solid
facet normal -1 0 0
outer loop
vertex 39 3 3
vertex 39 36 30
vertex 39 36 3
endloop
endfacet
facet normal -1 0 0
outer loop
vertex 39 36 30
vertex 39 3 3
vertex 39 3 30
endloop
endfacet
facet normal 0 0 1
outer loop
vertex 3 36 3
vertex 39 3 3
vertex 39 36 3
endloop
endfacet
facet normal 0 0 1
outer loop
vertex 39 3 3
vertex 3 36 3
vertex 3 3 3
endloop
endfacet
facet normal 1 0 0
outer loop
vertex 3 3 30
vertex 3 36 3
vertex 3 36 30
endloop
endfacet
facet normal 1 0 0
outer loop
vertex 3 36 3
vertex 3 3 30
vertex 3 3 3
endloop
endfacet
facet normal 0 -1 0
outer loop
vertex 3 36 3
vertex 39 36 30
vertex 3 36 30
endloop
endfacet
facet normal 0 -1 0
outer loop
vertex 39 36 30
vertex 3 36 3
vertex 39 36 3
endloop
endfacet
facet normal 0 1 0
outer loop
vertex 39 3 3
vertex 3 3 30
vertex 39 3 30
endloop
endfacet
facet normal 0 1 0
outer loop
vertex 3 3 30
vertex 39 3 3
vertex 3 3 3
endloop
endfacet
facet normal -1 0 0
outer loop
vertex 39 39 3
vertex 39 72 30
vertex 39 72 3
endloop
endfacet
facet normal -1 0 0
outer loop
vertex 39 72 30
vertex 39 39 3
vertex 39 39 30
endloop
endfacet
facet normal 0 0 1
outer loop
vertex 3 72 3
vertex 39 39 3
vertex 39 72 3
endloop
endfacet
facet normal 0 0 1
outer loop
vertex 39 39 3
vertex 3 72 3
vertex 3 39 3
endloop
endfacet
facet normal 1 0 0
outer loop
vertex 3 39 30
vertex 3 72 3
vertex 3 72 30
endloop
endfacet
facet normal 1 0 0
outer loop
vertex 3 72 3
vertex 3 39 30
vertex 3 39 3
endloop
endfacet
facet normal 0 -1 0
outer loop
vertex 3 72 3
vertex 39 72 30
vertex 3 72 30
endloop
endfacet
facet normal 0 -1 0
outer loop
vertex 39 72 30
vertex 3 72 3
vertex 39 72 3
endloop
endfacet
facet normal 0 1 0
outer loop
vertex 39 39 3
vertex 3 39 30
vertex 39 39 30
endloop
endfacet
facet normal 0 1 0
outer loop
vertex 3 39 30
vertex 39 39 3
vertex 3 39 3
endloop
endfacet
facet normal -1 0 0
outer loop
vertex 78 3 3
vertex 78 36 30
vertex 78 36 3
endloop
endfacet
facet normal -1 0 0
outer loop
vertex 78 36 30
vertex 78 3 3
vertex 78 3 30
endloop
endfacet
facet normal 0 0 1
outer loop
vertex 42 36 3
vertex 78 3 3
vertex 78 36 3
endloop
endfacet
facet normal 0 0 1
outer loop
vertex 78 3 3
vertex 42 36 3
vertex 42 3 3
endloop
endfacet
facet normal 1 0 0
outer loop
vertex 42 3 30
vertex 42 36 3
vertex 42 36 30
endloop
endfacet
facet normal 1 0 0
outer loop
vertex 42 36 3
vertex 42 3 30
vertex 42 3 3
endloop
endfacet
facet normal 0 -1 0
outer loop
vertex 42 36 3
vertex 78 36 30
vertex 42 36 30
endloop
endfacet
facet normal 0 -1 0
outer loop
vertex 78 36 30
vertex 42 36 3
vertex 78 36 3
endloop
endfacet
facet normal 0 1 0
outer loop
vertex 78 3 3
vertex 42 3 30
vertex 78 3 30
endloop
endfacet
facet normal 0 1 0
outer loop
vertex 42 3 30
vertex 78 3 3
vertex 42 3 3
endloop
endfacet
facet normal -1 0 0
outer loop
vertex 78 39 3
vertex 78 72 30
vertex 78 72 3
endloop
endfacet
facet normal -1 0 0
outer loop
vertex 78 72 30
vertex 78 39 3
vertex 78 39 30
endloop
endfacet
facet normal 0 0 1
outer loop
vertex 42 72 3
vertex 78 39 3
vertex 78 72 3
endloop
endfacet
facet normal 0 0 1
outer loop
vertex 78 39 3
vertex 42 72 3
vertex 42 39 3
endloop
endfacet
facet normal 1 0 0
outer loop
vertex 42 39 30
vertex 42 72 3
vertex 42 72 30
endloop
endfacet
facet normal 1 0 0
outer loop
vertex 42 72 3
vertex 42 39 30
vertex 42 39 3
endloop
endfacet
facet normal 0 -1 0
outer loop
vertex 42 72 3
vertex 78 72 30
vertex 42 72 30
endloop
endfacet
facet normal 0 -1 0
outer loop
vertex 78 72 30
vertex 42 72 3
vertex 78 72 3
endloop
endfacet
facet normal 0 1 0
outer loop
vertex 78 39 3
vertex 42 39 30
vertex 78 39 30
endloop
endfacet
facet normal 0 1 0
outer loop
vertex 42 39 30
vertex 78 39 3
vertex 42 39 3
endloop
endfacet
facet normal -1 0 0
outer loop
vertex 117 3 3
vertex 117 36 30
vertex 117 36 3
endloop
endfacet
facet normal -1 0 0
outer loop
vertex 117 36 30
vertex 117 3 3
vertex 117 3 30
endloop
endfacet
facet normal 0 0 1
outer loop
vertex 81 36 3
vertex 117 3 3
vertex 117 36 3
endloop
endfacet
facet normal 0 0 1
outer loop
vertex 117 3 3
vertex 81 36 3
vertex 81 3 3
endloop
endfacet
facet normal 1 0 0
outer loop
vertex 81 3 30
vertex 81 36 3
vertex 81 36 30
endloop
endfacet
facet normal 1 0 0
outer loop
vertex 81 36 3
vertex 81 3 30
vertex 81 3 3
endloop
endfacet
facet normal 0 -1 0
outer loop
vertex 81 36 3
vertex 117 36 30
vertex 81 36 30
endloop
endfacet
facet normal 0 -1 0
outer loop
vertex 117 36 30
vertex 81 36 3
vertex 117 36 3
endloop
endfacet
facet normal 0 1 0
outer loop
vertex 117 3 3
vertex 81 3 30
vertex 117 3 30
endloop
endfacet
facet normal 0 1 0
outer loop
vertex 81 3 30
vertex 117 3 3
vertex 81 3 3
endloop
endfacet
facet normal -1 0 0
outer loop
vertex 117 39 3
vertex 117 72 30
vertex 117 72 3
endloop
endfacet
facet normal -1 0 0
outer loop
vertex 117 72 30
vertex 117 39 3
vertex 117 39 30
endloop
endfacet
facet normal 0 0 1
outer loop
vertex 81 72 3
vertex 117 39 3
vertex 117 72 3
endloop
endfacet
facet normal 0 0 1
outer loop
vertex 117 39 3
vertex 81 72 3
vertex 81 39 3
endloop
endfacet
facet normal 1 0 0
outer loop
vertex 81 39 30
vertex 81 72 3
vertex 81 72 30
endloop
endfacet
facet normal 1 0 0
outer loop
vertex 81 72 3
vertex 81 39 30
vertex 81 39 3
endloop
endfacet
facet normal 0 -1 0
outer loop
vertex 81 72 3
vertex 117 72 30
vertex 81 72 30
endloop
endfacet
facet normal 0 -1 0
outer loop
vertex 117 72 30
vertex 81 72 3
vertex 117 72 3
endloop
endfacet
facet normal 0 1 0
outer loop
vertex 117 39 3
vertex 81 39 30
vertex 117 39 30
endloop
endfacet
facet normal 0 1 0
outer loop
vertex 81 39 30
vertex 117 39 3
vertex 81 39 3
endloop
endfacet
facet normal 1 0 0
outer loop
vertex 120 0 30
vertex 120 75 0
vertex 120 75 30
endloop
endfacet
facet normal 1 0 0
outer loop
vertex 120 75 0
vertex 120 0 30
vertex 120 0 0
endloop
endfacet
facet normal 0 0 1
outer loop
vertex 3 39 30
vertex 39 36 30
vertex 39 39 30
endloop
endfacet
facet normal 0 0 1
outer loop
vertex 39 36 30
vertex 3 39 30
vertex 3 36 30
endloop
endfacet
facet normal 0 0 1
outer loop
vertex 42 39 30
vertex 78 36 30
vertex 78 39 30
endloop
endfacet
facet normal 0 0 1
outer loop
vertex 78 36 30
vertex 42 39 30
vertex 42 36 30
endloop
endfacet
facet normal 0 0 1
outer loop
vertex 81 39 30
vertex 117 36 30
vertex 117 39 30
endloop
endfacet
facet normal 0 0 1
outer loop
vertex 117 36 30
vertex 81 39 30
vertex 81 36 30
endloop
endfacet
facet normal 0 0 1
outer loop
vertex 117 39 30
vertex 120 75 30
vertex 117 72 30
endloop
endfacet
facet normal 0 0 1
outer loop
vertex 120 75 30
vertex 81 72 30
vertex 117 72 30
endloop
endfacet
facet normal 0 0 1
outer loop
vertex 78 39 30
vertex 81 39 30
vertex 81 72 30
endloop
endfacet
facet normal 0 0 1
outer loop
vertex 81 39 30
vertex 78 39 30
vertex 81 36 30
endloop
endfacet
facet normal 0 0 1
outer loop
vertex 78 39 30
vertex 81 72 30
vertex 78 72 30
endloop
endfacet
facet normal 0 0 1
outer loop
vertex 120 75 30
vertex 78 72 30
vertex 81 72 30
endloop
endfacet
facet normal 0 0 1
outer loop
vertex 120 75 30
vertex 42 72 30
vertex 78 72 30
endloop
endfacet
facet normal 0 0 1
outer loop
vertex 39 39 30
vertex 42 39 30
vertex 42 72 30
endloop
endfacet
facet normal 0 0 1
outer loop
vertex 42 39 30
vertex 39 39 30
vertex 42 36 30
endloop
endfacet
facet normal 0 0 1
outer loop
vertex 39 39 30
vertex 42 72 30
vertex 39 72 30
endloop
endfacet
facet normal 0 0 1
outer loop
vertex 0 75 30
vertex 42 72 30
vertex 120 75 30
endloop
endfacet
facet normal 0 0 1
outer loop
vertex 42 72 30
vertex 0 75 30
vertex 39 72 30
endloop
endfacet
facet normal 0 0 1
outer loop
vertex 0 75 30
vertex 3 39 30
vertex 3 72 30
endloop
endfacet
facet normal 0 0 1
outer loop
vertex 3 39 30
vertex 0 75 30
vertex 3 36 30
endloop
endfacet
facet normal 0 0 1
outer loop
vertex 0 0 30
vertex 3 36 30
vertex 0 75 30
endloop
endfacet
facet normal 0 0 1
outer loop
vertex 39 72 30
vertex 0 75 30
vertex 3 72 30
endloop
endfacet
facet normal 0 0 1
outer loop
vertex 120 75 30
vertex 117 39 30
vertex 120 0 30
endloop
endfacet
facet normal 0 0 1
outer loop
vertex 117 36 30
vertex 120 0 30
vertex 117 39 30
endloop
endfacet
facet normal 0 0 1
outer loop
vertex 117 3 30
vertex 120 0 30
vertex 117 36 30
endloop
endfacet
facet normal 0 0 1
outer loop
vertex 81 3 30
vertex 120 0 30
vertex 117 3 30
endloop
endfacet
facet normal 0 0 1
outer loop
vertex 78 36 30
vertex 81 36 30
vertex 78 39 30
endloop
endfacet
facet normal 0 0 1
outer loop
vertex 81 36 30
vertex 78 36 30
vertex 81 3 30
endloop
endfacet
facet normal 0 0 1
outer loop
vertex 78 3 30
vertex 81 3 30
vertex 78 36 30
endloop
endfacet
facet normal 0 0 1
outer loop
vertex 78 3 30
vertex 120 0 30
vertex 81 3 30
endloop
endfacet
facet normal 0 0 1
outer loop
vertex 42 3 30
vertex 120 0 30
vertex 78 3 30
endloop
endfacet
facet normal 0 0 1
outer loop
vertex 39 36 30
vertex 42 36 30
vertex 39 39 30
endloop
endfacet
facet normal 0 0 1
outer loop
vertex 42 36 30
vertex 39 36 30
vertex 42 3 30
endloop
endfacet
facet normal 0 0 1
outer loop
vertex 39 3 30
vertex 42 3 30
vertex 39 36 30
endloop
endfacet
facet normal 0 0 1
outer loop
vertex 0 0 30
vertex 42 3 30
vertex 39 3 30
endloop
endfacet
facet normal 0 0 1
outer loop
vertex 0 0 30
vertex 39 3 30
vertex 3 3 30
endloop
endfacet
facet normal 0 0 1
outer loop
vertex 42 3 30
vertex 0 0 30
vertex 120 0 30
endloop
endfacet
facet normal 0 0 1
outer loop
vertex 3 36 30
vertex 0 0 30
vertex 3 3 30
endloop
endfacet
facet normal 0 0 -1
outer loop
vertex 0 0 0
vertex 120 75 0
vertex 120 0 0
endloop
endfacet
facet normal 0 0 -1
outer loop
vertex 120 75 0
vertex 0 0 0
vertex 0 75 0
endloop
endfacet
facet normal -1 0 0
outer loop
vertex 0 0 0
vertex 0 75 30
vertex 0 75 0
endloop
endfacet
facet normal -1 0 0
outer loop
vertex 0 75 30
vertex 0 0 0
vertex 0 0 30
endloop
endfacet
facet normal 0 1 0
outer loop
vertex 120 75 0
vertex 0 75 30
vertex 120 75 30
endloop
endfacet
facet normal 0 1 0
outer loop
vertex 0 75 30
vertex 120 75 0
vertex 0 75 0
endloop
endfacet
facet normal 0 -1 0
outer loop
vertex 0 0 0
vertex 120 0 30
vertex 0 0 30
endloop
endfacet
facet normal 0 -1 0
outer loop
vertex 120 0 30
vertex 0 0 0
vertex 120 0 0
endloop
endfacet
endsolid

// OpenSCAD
width = 120;
depth = 75;
height = 30;

thickness = 3;

rows = 2;
columns = 3;

xsize = (width - (columns + 1)* thickness) / columns;
ysize = (depth - (rows + 1) * thickness) / rows;


difference() {
    cube([width, depth, height], false);
    
    for (x = [0:columns-1])
        for (y = [0:rows-1])
            translate([(x+1)*thickness+x*xsize, (y+1)*thickness+y*ysize, thickness])
                cube([xsize, ysize, height]);
};
